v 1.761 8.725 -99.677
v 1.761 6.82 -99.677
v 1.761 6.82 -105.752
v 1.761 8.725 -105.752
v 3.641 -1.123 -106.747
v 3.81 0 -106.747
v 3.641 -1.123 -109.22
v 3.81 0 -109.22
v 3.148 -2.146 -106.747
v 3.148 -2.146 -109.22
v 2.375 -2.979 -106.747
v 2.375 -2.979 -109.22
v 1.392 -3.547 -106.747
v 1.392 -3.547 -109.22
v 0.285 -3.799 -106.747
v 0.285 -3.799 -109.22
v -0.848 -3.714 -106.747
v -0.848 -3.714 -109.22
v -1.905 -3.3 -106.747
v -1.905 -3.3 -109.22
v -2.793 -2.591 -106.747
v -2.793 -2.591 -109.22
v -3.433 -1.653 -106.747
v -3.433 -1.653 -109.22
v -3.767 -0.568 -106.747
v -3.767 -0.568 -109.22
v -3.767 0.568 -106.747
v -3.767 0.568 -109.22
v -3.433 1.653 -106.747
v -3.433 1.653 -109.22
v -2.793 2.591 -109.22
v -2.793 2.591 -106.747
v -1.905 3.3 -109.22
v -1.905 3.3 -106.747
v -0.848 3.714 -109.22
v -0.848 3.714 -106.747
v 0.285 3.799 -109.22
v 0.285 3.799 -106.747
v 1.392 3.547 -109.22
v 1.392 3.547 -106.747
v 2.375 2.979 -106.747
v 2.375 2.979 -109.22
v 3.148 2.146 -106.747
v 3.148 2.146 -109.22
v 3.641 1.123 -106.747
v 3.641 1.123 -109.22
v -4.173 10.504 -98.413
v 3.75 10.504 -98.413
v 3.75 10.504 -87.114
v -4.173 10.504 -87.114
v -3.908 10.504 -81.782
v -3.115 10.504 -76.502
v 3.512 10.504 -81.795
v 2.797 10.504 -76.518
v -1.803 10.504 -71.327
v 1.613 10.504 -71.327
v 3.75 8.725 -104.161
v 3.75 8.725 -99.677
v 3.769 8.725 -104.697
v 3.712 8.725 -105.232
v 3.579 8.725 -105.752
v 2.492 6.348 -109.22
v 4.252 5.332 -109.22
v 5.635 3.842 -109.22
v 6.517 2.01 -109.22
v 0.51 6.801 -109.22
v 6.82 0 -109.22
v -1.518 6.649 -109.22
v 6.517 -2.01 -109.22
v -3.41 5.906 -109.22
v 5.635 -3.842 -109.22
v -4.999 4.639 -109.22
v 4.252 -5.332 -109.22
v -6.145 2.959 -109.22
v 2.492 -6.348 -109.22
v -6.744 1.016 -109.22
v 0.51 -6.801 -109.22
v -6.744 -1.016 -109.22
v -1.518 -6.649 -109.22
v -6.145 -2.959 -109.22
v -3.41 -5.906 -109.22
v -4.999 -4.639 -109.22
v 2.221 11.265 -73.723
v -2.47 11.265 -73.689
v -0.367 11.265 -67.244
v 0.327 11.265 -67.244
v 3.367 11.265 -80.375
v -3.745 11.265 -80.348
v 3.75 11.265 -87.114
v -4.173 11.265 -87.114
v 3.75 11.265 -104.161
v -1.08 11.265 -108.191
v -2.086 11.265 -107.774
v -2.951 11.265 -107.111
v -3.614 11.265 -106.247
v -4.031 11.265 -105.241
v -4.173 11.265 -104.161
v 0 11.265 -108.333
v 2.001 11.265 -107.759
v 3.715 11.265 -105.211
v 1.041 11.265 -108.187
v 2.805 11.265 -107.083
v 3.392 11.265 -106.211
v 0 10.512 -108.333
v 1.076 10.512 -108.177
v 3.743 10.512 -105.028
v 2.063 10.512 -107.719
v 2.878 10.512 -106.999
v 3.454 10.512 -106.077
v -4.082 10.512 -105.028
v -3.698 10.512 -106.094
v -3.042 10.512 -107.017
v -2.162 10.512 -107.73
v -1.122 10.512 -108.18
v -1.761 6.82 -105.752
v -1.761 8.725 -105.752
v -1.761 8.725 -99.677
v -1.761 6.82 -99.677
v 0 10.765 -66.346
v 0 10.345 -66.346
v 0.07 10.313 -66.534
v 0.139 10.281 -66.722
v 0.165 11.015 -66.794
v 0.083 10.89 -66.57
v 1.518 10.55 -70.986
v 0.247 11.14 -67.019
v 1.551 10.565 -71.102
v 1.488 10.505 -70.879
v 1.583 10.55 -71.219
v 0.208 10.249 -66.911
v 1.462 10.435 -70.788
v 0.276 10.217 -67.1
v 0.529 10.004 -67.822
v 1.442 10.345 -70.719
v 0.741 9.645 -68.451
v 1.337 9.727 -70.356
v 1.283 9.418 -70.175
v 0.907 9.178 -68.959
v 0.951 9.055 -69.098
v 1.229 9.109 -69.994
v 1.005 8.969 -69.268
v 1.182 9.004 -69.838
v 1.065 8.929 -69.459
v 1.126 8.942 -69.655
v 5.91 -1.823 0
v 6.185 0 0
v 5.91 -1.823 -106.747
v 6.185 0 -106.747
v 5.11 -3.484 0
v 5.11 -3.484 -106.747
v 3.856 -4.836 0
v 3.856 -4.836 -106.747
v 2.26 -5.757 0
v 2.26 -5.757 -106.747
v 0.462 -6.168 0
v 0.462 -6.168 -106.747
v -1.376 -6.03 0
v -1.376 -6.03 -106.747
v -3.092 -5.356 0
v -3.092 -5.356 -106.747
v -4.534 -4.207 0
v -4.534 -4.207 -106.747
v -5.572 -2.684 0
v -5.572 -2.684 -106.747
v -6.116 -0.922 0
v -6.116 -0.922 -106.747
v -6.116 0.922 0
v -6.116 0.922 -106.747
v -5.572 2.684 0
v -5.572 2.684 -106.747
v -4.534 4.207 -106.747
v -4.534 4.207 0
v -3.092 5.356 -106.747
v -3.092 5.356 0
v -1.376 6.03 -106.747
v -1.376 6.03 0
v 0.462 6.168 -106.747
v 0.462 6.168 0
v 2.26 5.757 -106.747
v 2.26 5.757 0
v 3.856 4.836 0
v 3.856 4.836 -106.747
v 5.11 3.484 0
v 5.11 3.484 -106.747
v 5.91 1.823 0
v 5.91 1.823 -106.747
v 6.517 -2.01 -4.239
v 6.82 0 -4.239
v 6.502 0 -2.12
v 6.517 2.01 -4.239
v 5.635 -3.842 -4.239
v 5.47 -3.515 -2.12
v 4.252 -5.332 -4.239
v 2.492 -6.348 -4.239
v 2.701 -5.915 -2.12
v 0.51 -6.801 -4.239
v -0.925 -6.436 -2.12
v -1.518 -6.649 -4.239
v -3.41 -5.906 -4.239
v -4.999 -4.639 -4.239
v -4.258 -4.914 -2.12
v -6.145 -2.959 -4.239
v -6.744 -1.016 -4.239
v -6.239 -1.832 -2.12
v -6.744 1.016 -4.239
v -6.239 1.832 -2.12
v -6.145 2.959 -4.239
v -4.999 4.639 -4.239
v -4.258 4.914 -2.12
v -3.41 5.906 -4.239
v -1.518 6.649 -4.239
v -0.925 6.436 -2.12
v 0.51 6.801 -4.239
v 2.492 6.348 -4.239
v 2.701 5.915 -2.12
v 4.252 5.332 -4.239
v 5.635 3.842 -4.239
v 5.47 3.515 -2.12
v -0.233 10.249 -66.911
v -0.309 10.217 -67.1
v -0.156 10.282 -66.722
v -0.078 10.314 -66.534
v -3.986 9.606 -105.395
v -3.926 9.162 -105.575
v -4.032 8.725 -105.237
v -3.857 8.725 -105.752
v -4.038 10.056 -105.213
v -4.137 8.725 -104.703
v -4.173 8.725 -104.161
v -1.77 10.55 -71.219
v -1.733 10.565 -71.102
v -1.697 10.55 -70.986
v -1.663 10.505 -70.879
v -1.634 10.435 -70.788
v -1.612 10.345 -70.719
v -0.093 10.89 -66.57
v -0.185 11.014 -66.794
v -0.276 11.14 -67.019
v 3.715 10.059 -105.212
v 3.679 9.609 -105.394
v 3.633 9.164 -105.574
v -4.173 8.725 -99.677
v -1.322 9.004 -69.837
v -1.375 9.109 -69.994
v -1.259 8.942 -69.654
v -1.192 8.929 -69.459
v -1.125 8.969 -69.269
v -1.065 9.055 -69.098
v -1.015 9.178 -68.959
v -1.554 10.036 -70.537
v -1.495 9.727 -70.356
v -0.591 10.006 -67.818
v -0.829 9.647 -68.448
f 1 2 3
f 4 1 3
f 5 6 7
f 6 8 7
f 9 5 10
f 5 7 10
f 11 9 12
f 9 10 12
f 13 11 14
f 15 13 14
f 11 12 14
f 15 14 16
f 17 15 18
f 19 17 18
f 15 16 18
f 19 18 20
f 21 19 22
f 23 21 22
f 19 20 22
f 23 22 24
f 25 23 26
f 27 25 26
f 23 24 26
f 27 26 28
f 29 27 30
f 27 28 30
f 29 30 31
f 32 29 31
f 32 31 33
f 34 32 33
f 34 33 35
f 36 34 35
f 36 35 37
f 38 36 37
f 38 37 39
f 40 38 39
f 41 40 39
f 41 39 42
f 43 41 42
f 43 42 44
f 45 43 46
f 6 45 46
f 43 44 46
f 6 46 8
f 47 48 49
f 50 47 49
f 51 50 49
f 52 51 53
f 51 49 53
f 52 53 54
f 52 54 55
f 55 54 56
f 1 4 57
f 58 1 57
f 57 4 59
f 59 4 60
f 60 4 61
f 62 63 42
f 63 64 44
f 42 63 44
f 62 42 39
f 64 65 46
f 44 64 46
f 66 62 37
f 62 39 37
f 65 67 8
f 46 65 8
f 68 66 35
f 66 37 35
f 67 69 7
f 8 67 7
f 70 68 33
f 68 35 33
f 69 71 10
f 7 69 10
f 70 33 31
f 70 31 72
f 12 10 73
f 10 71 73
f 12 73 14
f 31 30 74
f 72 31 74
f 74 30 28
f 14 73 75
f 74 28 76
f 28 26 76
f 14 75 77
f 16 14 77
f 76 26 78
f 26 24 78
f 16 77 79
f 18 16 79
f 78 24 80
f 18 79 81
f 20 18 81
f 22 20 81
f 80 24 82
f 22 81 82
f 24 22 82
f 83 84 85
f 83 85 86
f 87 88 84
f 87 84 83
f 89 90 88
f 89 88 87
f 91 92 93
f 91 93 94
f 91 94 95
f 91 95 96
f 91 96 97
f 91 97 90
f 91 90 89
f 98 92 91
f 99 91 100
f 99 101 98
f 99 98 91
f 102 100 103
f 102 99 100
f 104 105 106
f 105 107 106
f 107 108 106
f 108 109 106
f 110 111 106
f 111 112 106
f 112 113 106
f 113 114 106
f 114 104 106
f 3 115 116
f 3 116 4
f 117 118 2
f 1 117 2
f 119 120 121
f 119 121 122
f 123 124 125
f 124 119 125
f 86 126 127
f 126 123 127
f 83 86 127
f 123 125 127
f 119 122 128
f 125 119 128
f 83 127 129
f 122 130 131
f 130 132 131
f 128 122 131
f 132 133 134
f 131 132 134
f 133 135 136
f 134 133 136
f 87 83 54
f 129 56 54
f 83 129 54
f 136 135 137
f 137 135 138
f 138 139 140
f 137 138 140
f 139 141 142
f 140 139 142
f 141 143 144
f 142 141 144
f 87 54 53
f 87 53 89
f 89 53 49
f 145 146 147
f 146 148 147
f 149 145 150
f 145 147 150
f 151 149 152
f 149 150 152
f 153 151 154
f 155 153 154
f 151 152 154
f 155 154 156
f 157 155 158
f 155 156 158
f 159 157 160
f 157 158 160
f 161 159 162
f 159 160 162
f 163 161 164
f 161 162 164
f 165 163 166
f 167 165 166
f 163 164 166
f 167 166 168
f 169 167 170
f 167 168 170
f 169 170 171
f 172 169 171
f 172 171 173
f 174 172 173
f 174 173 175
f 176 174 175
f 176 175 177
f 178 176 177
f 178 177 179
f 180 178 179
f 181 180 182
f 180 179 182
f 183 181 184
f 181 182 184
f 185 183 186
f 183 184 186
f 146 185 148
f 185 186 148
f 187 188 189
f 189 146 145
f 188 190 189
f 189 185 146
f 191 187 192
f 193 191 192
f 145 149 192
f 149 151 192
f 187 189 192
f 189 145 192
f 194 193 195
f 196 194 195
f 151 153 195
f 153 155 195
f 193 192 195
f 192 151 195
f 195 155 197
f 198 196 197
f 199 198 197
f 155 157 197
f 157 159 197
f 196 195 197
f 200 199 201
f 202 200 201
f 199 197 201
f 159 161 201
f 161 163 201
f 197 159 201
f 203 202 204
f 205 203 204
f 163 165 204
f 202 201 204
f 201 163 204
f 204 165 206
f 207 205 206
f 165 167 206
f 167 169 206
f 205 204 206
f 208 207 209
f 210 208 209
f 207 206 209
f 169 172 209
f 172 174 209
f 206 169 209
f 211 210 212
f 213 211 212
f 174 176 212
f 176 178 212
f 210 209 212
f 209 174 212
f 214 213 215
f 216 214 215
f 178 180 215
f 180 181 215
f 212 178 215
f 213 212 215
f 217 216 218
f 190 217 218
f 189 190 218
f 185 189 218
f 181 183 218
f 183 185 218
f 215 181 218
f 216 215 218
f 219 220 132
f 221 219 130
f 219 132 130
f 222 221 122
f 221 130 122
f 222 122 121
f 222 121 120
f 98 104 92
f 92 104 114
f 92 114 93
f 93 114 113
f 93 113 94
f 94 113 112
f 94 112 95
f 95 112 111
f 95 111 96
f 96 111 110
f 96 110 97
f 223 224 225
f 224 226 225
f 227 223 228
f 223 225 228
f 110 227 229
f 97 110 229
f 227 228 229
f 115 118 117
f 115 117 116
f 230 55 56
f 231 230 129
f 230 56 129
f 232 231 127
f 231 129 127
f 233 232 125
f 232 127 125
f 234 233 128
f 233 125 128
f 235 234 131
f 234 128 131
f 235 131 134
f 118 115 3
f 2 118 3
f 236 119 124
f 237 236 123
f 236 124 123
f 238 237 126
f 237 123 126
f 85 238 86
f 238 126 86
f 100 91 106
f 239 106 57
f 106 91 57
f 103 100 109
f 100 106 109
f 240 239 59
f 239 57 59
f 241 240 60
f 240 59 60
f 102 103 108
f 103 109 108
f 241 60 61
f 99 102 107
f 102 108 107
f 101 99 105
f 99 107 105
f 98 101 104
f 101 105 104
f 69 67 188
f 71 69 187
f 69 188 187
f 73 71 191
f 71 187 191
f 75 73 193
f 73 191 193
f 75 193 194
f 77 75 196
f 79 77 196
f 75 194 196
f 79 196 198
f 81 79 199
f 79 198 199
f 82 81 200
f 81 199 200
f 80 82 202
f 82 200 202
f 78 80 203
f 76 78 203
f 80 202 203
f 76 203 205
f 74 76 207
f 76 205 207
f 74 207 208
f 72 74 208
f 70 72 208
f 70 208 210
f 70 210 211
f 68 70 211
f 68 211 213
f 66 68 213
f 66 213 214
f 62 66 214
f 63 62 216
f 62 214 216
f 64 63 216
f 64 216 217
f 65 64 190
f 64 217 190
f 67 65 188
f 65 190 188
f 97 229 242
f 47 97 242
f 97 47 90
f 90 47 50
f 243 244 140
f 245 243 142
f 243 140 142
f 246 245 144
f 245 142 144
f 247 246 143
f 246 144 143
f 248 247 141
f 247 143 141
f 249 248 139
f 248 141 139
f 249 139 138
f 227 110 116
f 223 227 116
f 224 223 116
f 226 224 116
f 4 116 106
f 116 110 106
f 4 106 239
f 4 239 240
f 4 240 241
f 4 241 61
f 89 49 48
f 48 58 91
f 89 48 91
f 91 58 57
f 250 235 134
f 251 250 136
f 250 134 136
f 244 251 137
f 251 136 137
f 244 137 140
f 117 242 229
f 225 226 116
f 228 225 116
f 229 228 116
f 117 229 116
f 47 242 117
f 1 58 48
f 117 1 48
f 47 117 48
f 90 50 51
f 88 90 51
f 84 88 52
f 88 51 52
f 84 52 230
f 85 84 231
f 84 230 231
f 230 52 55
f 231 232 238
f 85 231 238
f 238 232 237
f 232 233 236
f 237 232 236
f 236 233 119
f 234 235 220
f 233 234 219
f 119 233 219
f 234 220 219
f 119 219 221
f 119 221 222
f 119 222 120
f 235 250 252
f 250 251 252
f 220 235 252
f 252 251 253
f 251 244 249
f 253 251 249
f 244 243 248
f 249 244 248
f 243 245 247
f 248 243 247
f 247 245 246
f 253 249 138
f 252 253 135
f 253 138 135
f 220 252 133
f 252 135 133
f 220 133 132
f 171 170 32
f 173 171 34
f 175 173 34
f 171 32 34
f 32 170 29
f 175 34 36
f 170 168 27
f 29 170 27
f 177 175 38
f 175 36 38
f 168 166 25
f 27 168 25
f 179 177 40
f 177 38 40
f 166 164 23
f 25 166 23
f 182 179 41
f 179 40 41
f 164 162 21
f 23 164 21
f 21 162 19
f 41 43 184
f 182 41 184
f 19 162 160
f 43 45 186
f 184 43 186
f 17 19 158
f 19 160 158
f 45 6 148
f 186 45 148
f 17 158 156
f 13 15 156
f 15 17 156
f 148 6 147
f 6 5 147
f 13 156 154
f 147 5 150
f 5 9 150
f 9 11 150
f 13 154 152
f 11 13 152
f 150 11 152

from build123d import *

# Parameters (mm, degrees)
SKETCH3_W           = 3.521922762
SKETCH3_H           = 6.07537554
BOSS_EXTRUDE1_DEPTH = 1.905
BOSS_EXTRUDE2_DEPTH = 2.54
CUT_EXTRUDE2_DEPTH  = 111.307012646


with BuildPart() as part:
    # Sketch2 → Revolve1 (revolve)
    with BuildSketch(Plane(origin=(0, 0, 0), x_dir=(0, 0, -1), z_dir=(1, 0, 0))):
        Polygon((0, 6.1849), (106.746901339, 6.1849), (106.746901339, 3.81), (109.22, 3.81), (109.22, 6.1849), (109.22, 6.8199), (4.239390289, 6.8199), align=None)
    revolve(axis=Axis((0, 0, 0), (0, 0, -1)))


with BuildPart() as body_2:
    # Sketch3 → Boss-Extrude1 (new body)
    with BuildSketch(Plane(origin=(0, 6.8199, 0), x_dir=(1, 0, 0), z_dir=(0, 1, 0))):
        with Locations((0, 102.71450048)):
            Rectangle(SKETCH3_W, SKETCH3_H)
    extrude(amount=BOSS_EXTRUDE1_DEPTH)

    # Sketch4 → Boss-Extrude2 (add)
    with BuildSketch(Plane(origin=(0, 8.7249, 0), x_dir=(1, 0, 0), z_dir=(0, 1, 0))):
        with BuildLine():
            Line((-4.172743681, 104.160601623), (-4.172743681, 87.113896477))
            ThreePointArc((-4.172743681, 87.113896477), (-3.119236981, 76.522288583), (0, 66.345727533))
            ThreePointArc((0, 66.345727533), (2.805257987, 76.561857132), (3.750372795, 87.113896477))
            Line((3.750372795, 87.113896477), (3.750372795, 104.160601623))
            ThreePointArc((3.750372795, 104.160601623), (2.805222181, 107.082869738), (0, 108.333345304))
            ThreePointArc((0, 108.333345304), (-2.950575353, 107.111176976), (-4.172743681, 104.160601623))
        make_face()
    extrude(amount=BOSS_EXTRUDE2_DEPTH)

    # Sketch5 → Cut-Extrude2 (cut, through all)
    with BuildSketch(Plane(origin=(3.750372795, 0, 0), x_dir=(0, 0, -1), z_dir=(1, 0, 0))):
        with BuildLine():
            Line((67.1000348, 10.217368222), (66.345727533, 10.345449312))
            Line((66.345727533, 10.345449312), (66.345727533, 8.7249))
            Line((66.345727533, 8.7249), (99.67681271, 8.7249))
            Line((99.67681271, 8.7249), (98.413073124, 10.504307386))
            Line((98.413073124, 10.504307386), (71.326942087, 10.504307386))
            ThreePointArc((71.326942087, 10.504307386), (70.989862042, 10.550873607), (70.718583167, 10.345449312))
            Line((70.718583167, 10.345449312), (69.994340058, 9.109296751))
            ThreePointArc((69.994340058, 9.109296751), (69.46263006, 8.929174901), (68.959288933, 9.177785265))
            ThreePointArc((68.959288933, 9.177785265), (68.119325888, 9.857937398), (67.1000348, 10.217368222))
        make_face()
        Polygon((66.345727533, 10.765017716), (67.243856936, 11.2649), (66.345727533, 11.2649), align=None)
        Polygon((108.333345304, 10.512302611), (105.028366221, 10.512302611), (105.75218825, 8.7249), (108.333345304, 8.7249), align=None)
    extrude(amount=-CUT_EXTRUDE2_DEPTH, mode=Mode.SUBTRACT)


solid = Compound([part.part, body_2.part])
